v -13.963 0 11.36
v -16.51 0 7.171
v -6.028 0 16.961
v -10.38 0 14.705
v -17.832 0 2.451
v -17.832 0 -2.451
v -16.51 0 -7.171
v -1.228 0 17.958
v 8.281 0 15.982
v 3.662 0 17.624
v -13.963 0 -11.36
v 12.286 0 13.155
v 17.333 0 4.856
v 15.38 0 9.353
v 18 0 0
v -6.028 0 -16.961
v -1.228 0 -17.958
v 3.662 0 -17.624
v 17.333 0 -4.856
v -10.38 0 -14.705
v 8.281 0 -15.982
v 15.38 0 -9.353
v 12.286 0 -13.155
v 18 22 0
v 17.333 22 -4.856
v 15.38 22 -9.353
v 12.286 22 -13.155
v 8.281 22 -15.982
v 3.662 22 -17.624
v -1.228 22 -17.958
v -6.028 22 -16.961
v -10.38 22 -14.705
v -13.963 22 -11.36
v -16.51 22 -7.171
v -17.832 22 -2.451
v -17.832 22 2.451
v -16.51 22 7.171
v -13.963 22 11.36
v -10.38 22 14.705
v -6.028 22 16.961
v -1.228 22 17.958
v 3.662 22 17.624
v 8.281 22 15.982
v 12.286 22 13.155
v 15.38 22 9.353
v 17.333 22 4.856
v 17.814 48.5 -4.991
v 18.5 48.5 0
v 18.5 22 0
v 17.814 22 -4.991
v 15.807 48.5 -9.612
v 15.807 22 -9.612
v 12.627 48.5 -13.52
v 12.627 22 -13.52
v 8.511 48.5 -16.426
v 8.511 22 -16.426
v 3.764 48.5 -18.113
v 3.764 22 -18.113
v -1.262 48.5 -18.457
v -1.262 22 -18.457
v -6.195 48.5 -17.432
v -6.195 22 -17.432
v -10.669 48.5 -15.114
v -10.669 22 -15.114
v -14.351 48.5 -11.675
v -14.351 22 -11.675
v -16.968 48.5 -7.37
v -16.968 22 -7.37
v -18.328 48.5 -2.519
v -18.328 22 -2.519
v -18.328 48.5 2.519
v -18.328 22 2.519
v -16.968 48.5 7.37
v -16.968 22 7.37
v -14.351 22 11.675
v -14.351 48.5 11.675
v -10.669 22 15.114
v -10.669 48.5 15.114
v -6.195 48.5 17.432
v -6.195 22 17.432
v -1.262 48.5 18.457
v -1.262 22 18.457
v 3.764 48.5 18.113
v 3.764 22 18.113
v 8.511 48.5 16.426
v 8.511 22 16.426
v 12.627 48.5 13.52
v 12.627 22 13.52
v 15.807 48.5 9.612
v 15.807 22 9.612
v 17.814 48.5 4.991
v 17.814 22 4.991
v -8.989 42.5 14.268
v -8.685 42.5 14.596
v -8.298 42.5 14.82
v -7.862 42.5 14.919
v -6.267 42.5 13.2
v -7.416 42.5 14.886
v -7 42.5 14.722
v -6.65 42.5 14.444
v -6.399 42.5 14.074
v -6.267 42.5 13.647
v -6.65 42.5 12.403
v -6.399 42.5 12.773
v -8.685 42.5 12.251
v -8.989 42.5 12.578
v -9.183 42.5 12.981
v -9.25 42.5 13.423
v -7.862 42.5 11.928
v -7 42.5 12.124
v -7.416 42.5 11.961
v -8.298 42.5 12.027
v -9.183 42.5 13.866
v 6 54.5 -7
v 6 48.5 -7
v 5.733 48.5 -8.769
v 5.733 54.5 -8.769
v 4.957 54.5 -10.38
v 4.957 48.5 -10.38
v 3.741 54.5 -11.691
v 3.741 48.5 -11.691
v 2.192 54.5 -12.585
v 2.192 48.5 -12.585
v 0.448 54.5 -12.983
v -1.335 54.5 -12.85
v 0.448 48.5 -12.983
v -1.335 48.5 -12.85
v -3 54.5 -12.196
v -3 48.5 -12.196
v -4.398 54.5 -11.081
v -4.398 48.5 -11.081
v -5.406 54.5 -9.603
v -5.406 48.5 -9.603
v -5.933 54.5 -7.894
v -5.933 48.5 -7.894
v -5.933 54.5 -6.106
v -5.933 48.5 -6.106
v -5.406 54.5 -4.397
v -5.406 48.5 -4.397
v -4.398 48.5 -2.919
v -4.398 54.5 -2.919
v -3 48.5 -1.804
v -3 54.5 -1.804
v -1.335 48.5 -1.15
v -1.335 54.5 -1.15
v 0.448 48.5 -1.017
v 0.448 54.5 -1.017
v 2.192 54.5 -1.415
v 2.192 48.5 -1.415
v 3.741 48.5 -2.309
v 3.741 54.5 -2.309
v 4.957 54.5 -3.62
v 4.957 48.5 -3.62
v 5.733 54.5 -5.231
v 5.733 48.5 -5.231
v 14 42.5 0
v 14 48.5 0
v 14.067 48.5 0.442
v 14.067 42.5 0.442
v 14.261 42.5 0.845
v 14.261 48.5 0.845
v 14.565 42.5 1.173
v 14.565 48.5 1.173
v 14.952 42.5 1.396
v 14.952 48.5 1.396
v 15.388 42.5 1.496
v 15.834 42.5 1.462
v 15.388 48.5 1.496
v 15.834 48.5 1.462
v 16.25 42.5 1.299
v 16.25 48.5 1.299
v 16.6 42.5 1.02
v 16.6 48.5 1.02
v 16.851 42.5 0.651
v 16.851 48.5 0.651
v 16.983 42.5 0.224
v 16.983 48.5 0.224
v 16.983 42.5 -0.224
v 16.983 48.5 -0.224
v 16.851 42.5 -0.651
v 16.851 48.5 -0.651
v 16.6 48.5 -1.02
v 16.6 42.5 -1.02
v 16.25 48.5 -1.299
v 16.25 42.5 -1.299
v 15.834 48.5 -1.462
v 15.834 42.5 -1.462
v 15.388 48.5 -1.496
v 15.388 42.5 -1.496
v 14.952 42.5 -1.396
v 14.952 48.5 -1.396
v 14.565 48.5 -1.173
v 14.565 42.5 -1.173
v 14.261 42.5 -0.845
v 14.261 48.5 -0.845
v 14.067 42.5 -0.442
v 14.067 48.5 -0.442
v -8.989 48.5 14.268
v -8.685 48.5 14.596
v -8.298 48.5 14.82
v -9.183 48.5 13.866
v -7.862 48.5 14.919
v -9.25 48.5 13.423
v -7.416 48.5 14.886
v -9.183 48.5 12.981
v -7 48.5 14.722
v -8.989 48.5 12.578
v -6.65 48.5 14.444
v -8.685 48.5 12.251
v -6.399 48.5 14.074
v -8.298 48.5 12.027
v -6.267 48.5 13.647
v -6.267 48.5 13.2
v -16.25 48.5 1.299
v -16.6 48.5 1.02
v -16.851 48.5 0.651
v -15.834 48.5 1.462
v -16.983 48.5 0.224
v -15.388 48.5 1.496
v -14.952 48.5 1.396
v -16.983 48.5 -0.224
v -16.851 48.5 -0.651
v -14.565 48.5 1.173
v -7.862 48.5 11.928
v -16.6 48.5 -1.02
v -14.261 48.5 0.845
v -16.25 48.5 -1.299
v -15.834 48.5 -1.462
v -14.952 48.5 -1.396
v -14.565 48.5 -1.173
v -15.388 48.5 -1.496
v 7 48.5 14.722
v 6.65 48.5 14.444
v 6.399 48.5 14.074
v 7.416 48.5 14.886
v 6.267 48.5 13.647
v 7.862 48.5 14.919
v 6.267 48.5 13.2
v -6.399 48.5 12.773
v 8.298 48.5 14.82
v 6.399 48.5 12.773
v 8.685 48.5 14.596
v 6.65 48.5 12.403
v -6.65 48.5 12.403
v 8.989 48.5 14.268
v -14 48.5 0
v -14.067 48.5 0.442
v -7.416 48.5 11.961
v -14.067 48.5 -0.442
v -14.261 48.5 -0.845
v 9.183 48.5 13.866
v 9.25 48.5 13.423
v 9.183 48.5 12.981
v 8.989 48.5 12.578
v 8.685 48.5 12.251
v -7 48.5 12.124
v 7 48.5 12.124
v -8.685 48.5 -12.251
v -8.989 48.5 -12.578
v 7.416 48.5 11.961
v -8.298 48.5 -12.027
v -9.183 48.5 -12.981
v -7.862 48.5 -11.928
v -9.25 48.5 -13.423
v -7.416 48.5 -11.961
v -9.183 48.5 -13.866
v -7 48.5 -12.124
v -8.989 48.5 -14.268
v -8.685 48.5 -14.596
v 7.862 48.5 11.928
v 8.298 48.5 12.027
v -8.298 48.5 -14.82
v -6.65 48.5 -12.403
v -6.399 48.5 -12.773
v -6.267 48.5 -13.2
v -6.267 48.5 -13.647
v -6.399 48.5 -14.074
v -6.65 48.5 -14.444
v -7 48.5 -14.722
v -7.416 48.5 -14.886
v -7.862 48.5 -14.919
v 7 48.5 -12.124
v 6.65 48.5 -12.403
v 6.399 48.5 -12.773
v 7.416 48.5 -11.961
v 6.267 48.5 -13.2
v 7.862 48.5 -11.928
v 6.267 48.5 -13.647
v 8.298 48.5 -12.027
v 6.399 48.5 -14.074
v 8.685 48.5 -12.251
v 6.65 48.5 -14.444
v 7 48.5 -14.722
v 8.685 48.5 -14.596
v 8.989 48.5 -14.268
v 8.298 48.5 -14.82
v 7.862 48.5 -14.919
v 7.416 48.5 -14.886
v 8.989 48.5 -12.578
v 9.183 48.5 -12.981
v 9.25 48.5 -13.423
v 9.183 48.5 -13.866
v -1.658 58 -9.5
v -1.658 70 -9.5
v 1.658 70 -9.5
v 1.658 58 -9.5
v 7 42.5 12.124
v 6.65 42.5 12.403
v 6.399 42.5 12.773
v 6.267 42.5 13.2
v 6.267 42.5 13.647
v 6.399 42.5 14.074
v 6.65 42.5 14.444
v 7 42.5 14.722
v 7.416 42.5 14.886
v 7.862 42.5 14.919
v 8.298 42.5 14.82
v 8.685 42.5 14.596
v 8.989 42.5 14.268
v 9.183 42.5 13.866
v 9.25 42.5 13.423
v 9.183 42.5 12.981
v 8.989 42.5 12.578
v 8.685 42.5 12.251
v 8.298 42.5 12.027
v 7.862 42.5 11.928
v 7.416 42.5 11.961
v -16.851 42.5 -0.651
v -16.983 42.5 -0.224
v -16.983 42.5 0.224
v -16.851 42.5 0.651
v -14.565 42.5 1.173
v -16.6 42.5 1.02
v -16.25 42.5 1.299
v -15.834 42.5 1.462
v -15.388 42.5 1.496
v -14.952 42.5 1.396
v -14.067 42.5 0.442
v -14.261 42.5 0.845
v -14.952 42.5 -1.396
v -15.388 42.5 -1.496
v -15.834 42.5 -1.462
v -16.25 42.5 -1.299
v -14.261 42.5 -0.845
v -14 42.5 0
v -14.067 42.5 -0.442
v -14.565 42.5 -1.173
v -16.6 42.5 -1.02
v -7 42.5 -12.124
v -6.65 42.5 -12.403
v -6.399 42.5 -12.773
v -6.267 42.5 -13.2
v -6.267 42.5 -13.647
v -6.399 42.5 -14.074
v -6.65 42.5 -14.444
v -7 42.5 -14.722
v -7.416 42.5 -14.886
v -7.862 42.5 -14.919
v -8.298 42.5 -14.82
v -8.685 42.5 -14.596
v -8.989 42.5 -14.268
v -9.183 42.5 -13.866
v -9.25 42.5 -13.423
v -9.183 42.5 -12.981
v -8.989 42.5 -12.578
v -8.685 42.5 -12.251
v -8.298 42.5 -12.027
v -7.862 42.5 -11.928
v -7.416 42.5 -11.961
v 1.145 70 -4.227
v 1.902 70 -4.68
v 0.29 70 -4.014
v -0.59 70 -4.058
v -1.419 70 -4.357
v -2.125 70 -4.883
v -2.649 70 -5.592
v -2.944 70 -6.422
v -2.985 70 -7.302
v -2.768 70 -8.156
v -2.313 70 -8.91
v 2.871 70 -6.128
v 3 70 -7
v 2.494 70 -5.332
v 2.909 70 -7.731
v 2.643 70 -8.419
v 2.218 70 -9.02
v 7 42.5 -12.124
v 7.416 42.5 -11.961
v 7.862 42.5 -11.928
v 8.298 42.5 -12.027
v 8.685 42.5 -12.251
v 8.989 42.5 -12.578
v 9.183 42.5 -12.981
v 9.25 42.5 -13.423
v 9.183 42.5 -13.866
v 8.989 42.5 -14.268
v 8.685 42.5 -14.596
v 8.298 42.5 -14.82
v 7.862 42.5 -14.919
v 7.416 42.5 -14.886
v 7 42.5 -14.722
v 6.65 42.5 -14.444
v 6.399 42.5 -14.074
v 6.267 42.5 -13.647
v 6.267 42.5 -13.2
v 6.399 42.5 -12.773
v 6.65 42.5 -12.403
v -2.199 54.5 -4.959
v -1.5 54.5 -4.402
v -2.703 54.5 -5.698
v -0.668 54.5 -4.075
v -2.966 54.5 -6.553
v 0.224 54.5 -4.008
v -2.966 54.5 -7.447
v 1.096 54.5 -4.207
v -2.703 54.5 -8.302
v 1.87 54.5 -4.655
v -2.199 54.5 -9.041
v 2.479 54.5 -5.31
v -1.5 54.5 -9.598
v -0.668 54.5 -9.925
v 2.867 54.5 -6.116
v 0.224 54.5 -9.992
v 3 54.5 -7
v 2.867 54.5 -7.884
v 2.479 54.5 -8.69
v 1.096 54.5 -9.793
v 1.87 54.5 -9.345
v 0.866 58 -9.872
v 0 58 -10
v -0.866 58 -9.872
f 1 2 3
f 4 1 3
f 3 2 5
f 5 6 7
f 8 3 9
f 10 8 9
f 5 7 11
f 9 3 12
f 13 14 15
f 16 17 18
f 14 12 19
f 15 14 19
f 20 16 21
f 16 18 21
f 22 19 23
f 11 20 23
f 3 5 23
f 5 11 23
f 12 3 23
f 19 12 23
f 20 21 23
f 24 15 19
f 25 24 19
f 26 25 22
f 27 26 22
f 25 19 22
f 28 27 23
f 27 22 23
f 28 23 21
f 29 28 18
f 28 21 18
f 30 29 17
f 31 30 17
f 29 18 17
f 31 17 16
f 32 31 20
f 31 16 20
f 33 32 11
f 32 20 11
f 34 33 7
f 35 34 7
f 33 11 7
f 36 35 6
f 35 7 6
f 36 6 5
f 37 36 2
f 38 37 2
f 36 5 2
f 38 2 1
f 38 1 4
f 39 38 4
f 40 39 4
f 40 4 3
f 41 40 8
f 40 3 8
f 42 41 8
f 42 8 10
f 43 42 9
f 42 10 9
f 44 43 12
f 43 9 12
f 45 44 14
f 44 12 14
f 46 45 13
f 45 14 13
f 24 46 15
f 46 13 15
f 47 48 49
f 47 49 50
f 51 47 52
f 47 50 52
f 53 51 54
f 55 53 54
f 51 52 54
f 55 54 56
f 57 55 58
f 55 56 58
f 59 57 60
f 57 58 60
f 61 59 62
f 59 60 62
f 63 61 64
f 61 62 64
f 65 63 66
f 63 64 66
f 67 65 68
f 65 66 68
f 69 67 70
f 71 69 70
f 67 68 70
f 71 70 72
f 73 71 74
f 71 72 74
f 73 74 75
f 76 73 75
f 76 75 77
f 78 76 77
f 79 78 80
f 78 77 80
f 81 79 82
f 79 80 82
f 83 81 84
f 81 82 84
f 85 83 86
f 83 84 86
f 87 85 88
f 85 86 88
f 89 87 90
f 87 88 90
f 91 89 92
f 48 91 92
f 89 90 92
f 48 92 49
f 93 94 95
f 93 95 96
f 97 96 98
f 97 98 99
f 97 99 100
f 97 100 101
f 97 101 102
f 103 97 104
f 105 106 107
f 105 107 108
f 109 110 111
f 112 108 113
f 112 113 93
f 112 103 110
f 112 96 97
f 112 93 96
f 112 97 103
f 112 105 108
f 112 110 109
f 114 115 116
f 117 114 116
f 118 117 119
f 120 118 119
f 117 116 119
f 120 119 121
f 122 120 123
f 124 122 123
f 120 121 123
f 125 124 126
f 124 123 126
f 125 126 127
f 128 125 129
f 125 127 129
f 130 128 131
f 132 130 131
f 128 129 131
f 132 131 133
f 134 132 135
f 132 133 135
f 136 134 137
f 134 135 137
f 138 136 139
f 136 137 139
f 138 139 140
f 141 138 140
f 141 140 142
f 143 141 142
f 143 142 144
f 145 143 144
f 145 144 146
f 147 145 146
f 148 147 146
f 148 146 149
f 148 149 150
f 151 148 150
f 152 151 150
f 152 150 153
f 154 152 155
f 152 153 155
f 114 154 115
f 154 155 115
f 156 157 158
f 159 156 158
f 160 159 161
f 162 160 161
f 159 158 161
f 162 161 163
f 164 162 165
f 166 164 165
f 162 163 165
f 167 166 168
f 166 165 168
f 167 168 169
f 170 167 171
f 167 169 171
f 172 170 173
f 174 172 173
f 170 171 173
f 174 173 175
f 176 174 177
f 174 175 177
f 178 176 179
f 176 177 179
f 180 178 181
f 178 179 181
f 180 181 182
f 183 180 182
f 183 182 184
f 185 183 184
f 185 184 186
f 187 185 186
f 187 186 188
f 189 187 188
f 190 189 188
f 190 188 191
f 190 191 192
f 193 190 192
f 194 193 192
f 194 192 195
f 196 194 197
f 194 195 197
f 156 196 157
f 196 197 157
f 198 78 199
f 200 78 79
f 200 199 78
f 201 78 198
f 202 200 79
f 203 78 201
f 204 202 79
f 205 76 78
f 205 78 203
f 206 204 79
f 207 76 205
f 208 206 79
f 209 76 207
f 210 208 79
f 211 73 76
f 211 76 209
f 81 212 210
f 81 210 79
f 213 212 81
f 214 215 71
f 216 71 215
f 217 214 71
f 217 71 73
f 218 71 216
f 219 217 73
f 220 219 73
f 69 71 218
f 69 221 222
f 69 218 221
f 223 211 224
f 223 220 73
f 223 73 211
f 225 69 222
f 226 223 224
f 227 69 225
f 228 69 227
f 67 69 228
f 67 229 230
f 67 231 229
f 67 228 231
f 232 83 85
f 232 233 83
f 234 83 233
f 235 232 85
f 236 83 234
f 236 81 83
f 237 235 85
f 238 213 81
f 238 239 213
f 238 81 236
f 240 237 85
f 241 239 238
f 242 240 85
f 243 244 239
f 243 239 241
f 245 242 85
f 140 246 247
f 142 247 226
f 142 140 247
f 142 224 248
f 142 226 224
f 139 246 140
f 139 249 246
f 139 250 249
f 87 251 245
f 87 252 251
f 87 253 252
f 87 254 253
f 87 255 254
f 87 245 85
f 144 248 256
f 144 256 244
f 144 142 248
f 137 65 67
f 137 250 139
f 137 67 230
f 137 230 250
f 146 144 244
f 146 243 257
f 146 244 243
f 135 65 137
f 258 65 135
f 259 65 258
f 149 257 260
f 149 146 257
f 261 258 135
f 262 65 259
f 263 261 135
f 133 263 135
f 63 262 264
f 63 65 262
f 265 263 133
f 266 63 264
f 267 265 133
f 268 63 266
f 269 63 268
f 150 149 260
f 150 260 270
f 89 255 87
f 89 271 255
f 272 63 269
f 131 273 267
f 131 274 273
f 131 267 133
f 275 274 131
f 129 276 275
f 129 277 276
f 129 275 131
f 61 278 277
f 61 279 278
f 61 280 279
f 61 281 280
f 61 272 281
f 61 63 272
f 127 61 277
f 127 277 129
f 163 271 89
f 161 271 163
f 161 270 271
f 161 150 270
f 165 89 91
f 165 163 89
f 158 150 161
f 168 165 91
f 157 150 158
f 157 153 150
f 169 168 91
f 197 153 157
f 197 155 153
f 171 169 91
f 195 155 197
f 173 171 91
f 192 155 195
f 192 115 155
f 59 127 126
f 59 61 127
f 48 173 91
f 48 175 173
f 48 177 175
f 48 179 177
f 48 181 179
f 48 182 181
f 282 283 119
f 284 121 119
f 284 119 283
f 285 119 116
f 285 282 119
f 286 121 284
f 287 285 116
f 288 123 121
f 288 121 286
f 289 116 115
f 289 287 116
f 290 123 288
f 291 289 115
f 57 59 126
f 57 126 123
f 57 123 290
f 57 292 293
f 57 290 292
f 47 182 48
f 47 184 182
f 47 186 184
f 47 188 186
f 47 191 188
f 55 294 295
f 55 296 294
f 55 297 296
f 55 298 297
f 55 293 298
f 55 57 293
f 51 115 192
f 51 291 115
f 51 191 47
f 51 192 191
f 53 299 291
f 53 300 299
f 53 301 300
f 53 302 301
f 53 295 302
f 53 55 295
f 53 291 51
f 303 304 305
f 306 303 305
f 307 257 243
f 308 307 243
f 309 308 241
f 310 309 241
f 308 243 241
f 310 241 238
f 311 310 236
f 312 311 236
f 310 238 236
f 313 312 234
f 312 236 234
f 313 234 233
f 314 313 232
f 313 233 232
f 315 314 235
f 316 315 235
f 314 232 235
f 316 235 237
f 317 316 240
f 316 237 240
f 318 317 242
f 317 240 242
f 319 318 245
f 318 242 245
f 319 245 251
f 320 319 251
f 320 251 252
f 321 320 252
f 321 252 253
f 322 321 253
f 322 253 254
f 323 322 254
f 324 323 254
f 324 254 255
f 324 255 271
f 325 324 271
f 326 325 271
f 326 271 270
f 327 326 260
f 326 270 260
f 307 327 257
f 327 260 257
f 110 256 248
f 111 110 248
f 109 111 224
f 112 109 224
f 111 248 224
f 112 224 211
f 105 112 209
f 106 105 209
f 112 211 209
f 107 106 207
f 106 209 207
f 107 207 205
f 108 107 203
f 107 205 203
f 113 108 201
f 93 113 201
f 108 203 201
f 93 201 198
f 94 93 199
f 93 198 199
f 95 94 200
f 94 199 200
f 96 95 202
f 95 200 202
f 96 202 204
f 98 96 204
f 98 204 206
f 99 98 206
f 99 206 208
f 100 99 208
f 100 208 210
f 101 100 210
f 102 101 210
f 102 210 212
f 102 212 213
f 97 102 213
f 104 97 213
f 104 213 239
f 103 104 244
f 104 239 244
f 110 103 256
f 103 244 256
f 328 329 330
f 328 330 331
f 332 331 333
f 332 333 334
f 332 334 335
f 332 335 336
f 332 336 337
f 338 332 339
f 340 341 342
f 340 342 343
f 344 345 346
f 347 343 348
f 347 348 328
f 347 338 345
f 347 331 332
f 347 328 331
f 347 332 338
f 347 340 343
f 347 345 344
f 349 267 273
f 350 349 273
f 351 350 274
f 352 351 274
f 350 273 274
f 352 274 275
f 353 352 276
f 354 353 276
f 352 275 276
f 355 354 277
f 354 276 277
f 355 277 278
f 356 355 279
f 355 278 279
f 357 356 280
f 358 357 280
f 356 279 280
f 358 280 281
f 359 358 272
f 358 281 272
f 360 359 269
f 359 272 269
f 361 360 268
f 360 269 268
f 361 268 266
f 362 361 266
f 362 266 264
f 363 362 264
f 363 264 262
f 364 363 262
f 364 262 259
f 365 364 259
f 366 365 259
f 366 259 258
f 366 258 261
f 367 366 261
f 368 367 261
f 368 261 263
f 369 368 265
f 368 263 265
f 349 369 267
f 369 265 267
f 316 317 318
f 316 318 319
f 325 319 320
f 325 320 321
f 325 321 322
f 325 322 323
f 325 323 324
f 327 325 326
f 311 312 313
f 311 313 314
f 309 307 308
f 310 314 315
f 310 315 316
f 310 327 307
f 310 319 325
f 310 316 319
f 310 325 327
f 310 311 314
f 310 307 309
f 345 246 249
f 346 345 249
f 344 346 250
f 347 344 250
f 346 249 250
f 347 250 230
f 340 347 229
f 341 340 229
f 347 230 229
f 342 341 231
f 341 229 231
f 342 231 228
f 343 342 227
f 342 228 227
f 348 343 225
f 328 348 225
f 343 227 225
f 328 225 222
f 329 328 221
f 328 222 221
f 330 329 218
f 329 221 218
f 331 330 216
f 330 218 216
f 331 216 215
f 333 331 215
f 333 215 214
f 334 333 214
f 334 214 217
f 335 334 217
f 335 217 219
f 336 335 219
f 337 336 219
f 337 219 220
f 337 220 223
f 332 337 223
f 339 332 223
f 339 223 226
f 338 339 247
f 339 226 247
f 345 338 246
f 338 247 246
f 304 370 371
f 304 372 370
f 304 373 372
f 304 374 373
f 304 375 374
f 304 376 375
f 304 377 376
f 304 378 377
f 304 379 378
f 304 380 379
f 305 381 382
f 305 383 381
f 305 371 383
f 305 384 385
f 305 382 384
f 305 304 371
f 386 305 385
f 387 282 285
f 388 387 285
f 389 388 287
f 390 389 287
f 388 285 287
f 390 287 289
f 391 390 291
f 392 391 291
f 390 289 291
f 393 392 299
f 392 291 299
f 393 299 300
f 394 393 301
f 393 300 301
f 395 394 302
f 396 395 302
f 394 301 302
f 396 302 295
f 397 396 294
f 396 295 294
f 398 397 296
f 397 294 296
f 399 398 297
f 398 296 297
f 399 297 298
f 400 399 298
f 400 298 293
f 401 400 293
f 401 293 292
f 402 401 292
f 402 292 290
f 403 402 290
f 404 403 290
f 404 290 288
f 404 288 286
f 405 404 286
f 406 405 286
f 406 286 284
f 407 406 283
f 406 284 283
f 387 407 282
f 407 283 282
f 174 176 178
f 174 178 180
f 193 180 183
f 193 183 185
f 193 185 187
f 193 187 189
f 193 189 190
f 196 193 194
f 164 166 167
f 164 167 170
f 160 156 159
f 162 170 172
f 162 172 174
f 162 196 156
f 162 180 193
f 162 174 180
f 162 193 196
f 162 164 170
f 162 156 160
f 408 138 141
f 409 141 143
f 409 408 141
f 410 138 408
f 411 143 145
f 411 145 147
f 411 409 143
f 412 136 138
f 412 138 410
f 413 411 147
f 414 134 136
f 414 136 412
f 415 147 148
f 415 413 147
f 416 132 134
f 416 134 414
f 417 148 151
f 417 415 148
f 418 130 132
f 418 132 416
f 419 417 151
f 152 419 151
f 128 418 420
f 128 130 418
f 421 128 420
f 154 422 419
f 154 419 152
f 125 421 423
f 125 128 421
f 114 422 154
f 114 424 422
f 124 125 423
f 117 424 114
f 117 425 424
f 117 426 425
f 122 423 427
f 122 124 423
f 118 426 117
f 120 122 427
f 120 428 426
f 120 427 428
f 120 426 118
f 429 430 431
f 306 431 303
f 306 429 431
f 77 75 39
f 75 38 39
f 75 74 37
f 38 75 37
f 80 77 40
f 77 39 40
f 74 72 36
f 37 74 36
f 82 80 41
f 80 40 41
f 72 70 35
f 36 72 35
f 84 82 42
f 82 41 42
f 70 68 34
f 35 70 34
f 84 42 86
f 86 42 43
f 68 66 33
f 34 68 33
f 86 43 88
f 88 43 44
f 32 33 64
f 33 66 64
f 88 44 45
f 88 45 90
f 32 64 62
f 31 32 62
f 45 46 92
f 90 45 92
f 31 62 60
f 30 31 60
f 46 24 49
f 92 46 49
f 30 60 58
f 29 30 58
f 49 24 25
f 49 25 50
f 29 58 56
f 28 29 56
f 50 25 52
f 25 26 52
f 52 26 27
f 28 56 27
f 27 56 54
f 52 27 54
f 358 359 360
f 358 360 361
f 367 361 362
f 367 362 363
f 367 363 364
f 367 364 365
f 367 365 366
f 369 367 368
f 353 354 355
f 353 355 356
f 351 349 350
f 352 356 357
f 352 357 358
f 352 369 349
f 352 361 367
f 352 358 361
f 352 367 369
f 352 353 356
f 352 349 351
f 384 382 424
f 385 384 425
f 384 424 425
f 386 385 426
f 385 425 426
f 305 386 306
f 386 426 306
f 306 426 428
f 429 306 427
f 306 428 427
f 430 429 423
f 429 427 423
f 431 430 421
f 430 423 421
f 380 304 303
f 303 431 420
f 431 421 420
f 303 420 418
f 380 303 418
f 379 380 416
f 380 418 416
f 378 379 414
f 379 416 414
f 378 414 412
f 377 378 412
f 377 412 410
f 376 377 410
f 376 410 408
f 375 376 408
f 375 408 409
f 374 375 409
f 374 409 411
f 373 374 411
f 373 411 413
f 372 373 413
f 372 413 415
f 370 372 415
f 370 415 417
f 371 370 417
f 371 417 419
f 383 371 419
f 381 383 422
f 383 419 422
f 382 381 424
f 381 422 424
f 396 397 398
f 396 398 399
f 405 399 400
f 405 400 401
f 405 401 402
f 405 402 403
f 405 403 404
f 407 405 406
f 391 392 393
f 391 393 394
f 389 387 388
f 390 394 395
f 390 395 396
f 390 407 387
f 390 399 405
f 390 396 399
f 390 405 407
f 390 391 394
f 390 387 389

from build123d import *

# Parameters (mm, degrees)
SKETCH2_R               = 18
BOSS_EXTRUDE1_DEPTH     = 22
SKETCH3_R               = 18.5
BOSS_EXTRUDE2_DEPTH     = 26.5
SKETCH4_R               = 1.5
CUT_EXTRUDE1_DEPTH      = 6
CIRPATTERN1_COUNT       = 6
SKETCH5_R               = 6
BOSS_EXTRUDE3_DEPTH     = 6
SKETCH6_R               = 3
BOSS_EXTRUDE4_DEPTH     = 15.5
CUT_EXTRUDE2_DEPTH      = 1
CUT_EXTRUDE2_DEPTH_BACK = 12


with BuildPart() as part:
    # Sketch2 → Boss-Extrude1 (new body)
    with BuildSketch(Plane(origin=(0, 0, 0), x_dir=(1, 0, 0), z_dir=(0, 1, 0))):
        Circle(SKETCH2_R)
    extrude(amount=BOSS_EXTRUDE1_DEPTH)

    # Sketch3 → Boss-Extrude2 (add)
    with BuildSketch(Plane(origin=(0, 22, 0), x_dir=(1, 0, 0), z_dir=(0, 1, 0))):
        Circle(SKETCH3_R)
    extrude(amount=BOSS_EXTRUDE2_DEPTH)

    # Sketch4 → Cut-Extrude1 (cut)
    with BuildSketch(Plane(origin=(0, 48.5, 0), x_dir=(1, 0, 0), z_dir=(0, 1, 0))):
        with Locations((-15.5, 0)):
            Circle(SKETCH4_R)
    cut_extrude1 = extrude(amount=-CUT_EXTRUDE1_DEPTH, mode=Mode.SUBTRACT)

    # CirPattern1: Cut-Extrude1 ×6 about axis
    cirpattern1_axis = Axis((0, 0, 0), (0, 1, 0))
    for i in range(1, CIRPATTERN1_COUNT):
        add(cut_extrude1.rotate(cirpattern1_axis, i * 360 / CIRPATTERN1_COUNT), mode=Mode.SUBTRACT)

    # Sketch5 → Boss-Extrude3 (add)
    with BuildSketch(Plane(origin=(0, 48.5, 0), x_dir=(1, 0, 0), z_dir=(0, 1, 0))):
        with Locations((0, 7)):
            Circle(SKETCH5_R)
    extrude(amount=BOSS_EXTRUDE3_DEPTH)

    # Sketch6 → Boss-Extrude4 (add)
    with BuildSketch(Plane(origin=(0, 54.5, 0), x_dir=(1, 0, 0), z_dir=(0, 1, 0))):
        with Locations((0, 7)):
            Circle(SKETCH6_R)
    extrude(amount=BOSS_EXTRUDE4_DEPTH)

    # Sketch7 → Cut-Extrude2 (cut, two sides)
    with BuildSketch(Plane(origin=(0, 70, 0), x_dir=(1, 0, 0), z_dir=(0, 1, 0))) as cut_extrude2_sk:
        Polygon((-80.661403086, 9.5), (-1.6583, 9.5), (1.6583, 9.5), (80.661403086, 9.5), (80.661403086, 167.506206173), (-80.661403086, 167.506206173), align=None)
    extrude(amount=CUT_EXTRUDE2_DEPTH, mode=Mode.SUBTRACT)
    extrude(cut_extrude2_sk.sketch, amount=-CUT_EXTRUDE2_DEPTH_BACK, mode=Mode.SUBTRACT)


solid = part.part
